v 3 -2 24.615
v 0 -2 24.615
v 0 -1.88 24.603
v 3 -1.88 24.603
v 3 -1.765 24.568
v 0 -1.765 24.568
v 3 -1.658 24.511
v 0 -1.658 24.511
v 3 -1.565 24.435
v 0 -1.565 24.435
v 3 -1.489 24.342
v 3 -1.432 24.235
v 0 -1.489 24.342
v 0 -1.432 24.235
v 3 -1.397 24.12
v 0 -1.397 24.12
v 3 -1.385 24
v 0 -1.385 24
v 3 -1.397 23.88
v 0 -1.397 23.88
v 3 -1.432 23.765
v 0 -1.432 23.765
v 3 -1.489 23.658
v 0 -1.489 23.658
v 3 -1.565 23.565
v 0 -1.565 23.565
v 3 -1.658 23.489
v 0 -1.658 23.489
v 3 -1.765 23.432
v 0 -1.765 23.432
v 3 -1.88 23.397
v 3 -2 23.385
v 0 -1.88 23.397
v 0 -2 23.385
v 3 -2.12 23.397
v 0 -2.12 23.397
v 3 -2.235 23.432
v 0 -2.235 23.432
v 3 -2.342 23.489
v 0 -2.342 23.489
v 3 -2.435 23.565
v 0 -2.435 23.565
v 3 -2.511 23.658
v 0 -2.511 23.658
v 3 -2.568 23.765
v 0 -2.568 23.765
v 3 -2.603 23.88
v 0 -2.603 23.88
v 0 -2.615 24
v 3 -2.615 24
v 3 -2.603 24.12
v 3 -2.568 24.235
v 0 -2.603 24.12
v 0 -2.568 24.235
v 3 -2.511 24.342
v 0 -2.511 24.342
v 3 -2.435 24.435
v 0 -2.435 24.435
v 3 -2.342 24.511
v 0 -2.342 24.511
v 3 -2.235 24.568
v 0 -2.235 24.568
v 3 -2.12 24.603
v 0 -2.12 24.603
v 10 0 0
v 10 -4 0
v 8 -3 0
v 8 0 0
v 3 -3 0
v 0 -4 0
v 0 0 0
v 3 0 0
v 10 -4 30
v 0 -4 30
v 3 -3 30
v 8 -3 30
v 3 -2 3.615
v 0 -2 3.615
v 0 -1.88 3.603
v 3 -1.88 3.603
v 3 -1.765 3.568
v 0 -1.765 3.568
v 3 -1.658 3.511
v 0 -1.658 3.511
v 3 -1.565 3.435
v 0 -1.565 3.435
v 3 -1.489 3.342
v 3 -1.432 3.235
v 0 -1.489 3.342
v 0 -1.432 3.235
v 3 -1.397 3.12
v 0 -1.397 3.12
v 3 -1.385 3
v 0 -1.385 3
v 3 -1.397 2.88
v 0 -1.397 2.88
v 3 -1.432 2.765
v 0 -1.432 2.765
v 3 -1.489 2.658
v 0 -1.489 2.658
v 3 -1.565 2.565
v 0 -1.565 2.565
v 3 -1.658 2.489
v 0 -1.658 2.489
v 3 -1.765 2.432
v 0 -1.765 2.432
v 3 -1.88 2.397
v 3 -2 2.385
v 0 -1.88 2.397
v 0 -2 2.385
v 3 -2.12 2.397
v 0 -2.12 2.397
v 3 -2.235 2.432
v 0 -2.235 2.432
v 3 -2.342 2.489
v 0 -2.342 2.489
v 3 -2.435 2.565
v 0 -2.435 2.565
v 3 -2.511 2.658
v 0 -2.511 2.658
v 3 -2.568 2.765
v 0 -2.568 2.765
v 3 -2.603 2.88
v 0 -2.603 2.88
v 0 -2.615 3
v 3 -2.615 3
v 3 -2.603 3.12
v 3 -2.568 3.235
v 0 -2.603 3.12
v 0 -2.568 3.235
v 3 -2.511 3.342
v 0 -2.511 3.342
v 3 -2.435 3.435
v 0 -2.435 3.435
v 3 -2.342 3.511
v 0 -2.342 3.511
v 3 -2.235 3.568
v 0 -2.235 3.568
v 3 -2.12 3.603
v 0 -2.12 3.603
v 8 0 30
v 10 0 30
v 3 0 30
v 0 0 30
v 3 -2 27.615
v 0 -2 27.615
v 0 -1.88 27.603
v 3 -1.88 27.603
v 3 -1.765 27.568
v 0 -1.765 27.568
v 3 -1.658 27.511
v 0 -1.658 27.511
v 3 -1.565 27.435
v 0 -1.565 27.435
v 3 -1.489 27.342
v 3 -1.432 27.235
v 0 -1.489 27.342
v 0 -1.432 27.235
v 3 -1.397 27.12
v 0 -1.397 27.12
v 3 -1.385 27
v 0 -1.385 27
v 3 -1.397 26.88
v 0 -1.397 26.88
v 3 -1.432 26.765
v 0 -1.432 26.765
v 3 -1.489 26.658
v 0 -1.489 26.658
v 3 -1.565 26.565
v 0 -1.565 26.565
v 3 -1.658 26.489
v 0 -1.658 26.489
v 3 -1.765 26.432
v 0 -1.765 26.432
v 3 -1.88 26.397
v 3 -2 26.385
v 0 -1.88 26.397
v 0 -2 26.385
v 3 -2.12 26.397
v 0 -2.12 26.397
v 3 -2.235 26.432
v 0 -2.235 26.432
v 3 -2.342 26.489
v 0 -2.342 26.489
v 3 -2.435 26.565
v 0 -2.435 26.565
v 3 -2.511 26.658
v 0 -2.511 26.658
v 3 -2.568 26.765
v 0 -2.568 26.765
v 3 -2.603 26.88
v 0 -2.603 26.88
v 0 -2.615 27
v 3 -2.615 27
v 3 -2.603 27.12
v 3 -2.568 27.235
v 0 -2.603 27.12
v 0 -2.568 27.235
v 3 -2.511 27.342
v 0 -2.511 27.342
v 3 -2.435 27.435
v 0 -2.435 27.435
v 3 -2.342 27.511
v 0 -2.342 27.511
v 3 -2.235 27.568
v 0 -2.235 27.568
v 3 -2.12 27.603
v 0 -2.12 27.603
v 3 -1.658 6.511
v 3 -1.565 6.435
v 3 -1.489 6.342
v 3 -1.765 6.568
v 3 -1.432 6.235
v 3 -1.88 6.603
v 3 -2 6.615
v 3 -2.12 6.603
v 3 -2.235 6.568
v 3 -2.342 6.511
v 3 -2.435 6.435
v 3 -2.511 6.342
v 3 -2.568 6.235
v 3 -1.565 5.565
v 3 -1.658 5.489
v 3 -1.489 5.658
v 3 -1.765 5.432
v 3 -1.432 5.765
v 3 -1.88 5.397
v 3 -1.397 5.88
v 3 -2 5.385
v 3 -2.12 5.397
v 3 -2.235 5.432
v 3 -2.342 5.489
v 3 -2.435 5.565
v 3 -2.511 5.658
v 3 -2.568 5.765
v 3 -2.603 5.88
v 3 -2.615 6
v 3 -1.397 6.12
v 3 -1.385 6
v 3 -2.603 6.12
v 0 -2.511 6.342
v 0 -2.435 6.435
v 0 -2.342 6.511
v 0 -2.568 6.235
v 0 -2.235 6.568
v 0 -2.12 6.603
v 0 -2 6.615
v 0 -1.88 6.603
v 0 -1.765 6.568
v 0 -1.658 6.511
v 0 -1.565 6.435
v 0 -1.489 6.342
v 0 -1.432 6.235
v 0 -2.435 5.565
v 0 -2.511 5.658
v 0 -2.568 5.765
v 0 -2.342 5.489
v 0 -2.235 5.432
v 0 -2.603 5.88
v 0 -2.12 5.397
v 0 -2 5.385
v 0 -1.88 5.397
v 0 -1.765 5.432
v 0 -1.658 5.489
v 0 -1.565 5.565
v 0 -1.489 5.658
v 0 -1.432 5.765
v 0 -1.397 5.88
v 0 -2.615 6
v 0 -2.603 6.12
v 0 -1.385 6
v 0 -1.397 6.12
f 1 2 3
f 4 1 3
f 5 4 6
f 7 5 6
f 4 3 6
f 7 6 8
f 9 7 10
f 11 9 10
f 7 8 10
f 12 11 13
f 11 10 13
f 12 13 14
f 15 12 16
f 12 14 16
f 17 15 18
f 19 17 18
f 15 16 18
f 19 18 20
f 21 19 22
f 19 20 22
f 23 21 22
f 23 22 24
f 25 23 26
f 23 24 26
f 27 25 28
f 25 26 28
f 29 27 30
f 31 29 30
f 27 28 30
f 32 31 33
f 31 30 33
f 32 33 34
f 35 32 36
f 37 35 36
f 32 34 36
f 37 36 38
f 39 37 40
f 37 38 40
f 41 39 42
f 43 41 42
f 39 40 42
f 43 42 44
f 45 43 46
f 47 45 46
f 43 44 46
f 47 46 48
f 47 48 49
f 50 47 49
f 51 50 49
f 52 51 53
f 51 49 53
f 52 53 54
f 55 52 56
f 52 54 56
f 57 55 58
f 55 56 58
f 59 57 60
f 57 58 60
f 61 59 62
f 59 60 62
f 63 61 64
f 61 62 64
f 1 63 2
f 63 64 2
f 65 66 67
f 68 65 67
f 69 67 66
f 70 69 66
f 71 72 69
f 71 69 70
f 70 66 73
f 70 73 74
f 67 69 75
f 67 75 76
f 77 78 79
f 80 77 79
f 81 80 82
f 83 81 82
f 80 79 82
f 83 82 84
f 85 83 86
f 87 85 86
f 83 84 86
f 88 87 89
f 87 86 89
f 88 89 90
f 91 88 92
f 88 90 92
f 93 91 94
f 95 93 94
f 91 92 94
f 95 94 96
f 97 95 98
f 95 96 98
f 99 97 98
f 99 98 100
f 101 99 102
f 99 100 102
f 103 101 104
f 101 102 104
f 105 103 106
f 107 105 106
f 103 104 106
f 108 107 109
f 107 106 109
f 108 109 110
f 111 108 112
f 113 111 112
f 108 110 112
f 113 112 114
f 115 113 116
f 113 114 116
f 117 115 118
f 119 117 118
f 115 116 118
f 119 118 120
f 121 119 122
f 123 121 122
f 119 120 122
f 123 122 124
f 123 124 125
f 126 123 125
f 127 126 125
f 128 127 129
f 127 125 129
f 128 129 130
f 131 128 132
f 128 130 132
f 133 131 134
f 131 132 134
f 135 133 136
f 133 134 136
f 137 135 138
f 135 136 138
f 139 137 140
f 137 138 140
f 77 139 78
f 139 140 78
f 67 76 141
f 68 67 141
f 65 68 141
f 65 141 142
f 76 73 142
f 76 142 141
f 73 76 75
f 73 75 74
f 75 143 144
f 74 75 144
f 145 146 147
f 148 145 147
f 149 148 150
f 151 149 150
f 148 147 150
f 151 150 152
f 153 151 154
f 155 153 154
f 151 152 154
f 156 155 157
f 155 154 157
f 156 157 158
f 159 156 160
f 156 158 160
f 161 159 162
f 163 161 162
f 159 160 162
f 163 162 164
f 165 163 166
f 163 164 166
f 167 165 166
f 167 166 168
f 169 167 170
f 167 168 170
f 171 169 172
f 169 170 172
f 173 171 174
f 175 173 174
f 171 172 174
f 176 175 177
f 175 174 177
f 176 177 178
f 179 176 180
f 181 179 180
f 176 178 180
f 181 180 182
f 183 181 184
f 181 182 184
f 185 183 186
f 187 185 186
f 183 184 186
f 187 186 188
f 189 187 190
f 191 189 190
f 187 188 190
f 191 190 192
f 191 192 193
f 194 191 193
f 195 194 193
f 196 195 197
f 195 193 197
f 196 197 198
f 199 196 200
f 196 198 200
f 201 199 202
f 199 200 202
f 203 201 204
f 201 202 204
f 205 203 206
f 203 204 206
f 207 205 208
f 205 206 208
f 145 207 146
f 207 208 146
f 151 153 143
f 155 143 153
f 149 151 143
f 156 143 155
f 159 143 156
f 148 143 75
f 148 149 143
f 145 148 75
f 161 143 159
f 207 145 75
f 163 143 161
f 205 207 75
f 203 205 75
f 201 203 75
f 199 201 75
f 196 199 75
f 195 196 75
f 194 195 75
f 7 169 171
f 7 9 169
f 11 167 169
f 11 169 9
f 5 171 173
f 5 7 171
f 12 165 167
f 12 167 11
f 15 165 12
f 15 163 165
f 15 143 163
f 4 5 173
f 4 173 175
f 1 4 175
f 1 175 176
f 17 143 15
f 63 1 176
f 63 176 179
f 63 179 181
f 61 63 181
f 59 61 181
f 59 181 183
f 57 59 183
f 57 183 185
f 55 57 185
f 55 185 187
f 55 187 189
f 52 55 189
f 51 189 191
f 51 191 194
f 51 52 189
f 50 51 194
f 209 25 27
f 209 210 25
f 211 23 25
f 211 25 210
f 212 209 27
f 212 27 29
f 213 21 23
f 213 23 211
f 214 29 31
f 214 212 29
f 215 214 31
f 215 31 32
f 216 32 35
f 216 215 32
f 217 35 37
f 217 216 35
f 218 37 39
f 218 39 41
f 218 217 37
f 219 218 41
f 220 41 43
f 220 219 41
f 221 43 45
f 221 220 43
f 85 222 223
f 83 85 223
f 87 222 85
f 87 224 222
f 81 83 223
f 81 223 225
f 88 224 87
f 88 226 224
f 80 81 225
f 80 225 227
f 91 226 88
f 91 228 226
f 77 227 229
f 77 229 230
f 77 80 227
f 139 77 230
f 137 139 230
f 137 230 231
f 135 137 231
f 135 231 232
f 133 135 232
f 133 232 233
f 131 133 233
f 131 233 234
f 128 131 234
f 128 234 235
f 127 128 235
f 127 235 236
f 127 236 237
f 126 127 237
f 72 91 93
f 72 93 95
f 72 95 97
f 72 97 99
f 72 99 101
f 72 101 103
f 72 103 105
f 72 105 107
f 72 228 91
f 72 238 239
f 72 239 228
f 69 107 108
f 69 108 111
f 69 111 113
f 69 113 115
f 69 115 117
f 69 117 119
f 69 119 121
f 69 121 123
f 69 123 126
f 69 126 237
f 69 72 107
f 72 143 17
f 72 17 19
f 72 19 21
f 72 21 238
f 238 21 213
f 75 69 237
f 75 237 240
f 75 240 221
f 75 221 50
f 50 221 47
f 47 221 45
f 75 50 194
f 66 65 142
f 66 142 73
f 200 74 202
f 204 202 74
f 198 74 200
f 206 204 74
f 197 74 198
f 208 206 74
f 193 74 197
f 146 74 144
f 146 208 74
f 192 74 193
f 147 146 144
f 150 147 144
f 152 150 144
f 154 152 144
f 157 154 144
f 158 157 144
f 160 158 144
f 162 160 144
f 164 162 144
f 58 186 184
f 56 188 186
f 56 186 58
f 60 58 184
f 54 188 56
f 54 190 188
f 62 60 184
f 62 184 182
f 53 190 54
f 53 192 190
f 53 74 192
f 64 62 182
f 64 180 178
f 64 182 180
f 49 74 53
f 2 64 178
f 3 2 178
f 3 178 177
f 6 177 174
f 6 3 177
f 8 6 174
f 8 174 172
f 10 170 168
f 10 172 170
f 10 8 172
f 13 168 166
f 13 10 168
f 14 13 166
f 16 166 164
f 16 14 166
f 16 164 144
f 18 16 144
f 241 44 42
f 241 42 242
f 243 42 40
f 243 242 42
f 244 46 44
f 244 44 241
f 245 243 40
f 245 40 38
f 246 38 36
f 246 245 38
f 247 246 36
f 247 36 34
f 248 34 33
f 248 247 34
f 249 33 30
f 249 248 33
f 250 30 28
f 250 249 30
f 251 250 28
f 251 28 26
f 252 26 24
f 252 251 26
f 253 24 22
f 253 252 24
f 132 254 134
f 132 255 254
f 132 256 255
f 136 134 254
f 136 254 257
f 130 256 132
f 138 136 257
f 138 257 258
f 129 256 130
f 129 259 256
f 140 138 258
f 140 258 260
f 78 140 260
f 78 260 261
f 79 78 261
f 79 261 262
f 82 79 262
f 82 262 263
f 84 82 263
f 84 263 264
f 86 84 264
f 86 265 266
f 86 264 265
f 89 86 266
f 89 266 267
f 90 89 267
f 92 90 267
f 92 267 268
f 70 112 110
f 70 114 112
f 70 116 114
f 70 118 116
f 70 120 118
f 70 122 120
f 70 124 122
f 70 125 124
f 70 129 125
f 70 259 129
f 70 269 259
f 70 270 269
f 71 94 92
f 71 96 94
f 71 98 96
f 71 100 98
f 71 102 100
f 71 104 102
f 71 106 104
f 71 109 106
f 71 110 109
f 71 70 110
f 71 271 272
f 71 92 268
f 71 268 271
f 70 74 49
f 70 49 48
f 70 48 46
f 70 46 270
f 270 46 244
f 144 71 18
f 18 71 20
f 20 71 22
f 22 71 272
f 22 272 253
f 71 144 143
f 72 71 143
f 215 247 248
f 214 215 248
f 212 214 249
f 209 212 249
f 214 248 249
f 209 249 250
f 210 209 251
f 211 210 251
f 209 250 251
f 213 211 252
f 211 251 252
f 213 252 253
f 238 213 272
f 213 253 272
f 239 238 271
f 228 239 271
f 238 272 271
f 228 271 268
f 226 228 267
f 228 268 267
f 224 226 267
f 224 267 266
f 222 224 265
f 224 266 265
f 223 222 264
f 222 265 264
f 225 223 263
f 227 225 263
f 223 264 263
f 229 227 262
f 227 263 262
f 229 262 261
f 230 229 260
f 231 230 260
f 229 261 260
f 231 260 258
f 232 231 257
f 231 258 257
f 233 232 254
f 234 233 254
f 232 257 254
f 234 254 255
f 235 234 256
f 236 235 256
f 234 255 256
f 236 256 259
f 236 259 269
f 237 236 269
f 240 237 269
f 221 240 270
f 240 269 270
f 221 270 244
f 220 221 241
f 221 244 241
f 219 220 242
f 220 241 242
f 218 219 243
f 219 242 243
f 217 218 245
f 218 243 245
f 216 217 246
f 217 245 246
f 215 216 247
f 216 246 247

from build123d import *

# Parameters (mm, degrees)
BOSS_EXTRUDE1_DEPTH = 30
SKETCH2_R           = 0.615
CUT_EXTRUDE1_DEPTH  = 3


with BuildPart() as part:
    # Sketch1 → Boss-Extrude1 (new body)
    with BuildSketch(Plane.XY):
        Polygon((0, 0), (3, 0), (3, -3), (8, -3), (8, 0), (10, 0), (10, -4), (0, -4), align=None)
    extrude(amount=BOSS_EXTRUDE1_DEPTH)

    # Sketch2 → Cut-Extrude1 (cut)
    with BuildSketch(Plane.ZY):
        with Locations((3, -2)):
            Circle(SKETCH2_R)
        with Locations((6, -2)):
            Circle(SKETCH2_R)
        with Locations((24, -2)):
            Circle(SKETCH2_R)
        with Locations((27, -2)):
            Circle(SKETCH2_R)
    extrude(amount=-CUT_EXTRUDE1_DEPTH, mode=Mode.SUBTRACT)


solid = part.part
